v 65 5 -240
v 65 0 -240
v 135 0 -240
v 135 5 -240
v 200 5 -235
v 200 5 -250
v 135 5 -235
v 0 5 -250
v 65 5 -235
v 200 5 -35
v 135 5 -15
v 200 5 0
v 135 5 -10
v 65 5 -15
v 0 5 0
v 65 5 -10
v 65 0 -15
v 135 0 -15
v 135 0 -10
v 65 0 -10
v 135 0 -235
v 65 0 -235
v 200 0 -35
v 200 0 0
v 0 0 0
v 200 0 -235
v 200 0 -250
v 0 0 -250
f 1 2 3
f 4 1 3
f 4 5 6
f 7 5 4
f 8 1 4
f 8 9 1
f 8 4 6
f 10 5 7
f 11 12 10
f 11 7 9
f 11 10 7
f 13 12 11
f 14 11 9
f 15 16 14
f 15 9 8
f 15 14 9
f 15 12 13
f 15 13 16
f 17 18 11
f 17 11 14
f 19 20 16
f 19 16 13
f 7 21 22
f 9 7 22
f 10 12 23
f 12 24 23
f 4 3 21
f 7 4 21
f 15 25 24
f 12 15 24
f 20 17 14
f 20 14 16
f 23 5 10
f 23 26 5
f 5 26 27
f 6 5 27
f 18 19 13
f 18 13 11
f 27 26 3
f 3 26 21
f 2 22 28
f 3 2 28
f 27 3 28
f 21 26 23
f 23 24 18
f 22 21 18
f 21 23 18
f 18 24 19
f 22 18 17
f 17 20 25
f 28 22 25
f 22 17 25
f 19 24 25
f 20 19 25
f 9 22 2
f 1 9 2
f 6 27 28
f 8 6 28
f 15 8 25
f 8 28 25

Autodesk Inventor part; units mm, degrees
ref_plane "YZ Plane" through (0, 0, 0) normal (1, 0, 0) x (0, 1, 0)
ref_plane "XZ Plane" through (0, 0, 0) normal (0, 1, 0) x (-1, 0, 0)
ref_plane "XY Plane" through (0, 0, 0) normal (0, 0, 1) x (1, 0, 0)
sketch "Sketch1" plane through (0, 0, 0) normal (0, 1, 0) x (-1, 0, 0)
  line L0 (0, 0) -> (-200, 0)
  line L1 (-200, 0) -> (-200, -250)
  line L2 (-200, -250) -> (0, -250)
  line L3 (0, -250) -> (0, 0)
  line L4 (-65, -10) -> (-135, -10)
  line L5 (-135, -10) -> (-135, -15)
  line L6 (-135, -15) -> (-65, -15)
  line L7 (-65, -15) -> (-65, -10)
  line L8 (-200, -125) -> (0, -125) construction
  line L9 (-65, -240) -> (-135, -240)
  line L10 (-135, -240) -> (-135, -235)
  line L11 (-135, -235) -> (-65, -235)
  line L12 (-65, -235) -> (-65, -240)
  line L13 (-200, -235) -> (-200, -35)
  dimension "d0" = 200
  dimension "d2" = 70
  dimension "d3" = 5
  dimension "d11" = 10
  dimension "d12" = 230
extrude "Extrusion1" add sketch "Sketch1" along normal blind 5
properties part number "top"
